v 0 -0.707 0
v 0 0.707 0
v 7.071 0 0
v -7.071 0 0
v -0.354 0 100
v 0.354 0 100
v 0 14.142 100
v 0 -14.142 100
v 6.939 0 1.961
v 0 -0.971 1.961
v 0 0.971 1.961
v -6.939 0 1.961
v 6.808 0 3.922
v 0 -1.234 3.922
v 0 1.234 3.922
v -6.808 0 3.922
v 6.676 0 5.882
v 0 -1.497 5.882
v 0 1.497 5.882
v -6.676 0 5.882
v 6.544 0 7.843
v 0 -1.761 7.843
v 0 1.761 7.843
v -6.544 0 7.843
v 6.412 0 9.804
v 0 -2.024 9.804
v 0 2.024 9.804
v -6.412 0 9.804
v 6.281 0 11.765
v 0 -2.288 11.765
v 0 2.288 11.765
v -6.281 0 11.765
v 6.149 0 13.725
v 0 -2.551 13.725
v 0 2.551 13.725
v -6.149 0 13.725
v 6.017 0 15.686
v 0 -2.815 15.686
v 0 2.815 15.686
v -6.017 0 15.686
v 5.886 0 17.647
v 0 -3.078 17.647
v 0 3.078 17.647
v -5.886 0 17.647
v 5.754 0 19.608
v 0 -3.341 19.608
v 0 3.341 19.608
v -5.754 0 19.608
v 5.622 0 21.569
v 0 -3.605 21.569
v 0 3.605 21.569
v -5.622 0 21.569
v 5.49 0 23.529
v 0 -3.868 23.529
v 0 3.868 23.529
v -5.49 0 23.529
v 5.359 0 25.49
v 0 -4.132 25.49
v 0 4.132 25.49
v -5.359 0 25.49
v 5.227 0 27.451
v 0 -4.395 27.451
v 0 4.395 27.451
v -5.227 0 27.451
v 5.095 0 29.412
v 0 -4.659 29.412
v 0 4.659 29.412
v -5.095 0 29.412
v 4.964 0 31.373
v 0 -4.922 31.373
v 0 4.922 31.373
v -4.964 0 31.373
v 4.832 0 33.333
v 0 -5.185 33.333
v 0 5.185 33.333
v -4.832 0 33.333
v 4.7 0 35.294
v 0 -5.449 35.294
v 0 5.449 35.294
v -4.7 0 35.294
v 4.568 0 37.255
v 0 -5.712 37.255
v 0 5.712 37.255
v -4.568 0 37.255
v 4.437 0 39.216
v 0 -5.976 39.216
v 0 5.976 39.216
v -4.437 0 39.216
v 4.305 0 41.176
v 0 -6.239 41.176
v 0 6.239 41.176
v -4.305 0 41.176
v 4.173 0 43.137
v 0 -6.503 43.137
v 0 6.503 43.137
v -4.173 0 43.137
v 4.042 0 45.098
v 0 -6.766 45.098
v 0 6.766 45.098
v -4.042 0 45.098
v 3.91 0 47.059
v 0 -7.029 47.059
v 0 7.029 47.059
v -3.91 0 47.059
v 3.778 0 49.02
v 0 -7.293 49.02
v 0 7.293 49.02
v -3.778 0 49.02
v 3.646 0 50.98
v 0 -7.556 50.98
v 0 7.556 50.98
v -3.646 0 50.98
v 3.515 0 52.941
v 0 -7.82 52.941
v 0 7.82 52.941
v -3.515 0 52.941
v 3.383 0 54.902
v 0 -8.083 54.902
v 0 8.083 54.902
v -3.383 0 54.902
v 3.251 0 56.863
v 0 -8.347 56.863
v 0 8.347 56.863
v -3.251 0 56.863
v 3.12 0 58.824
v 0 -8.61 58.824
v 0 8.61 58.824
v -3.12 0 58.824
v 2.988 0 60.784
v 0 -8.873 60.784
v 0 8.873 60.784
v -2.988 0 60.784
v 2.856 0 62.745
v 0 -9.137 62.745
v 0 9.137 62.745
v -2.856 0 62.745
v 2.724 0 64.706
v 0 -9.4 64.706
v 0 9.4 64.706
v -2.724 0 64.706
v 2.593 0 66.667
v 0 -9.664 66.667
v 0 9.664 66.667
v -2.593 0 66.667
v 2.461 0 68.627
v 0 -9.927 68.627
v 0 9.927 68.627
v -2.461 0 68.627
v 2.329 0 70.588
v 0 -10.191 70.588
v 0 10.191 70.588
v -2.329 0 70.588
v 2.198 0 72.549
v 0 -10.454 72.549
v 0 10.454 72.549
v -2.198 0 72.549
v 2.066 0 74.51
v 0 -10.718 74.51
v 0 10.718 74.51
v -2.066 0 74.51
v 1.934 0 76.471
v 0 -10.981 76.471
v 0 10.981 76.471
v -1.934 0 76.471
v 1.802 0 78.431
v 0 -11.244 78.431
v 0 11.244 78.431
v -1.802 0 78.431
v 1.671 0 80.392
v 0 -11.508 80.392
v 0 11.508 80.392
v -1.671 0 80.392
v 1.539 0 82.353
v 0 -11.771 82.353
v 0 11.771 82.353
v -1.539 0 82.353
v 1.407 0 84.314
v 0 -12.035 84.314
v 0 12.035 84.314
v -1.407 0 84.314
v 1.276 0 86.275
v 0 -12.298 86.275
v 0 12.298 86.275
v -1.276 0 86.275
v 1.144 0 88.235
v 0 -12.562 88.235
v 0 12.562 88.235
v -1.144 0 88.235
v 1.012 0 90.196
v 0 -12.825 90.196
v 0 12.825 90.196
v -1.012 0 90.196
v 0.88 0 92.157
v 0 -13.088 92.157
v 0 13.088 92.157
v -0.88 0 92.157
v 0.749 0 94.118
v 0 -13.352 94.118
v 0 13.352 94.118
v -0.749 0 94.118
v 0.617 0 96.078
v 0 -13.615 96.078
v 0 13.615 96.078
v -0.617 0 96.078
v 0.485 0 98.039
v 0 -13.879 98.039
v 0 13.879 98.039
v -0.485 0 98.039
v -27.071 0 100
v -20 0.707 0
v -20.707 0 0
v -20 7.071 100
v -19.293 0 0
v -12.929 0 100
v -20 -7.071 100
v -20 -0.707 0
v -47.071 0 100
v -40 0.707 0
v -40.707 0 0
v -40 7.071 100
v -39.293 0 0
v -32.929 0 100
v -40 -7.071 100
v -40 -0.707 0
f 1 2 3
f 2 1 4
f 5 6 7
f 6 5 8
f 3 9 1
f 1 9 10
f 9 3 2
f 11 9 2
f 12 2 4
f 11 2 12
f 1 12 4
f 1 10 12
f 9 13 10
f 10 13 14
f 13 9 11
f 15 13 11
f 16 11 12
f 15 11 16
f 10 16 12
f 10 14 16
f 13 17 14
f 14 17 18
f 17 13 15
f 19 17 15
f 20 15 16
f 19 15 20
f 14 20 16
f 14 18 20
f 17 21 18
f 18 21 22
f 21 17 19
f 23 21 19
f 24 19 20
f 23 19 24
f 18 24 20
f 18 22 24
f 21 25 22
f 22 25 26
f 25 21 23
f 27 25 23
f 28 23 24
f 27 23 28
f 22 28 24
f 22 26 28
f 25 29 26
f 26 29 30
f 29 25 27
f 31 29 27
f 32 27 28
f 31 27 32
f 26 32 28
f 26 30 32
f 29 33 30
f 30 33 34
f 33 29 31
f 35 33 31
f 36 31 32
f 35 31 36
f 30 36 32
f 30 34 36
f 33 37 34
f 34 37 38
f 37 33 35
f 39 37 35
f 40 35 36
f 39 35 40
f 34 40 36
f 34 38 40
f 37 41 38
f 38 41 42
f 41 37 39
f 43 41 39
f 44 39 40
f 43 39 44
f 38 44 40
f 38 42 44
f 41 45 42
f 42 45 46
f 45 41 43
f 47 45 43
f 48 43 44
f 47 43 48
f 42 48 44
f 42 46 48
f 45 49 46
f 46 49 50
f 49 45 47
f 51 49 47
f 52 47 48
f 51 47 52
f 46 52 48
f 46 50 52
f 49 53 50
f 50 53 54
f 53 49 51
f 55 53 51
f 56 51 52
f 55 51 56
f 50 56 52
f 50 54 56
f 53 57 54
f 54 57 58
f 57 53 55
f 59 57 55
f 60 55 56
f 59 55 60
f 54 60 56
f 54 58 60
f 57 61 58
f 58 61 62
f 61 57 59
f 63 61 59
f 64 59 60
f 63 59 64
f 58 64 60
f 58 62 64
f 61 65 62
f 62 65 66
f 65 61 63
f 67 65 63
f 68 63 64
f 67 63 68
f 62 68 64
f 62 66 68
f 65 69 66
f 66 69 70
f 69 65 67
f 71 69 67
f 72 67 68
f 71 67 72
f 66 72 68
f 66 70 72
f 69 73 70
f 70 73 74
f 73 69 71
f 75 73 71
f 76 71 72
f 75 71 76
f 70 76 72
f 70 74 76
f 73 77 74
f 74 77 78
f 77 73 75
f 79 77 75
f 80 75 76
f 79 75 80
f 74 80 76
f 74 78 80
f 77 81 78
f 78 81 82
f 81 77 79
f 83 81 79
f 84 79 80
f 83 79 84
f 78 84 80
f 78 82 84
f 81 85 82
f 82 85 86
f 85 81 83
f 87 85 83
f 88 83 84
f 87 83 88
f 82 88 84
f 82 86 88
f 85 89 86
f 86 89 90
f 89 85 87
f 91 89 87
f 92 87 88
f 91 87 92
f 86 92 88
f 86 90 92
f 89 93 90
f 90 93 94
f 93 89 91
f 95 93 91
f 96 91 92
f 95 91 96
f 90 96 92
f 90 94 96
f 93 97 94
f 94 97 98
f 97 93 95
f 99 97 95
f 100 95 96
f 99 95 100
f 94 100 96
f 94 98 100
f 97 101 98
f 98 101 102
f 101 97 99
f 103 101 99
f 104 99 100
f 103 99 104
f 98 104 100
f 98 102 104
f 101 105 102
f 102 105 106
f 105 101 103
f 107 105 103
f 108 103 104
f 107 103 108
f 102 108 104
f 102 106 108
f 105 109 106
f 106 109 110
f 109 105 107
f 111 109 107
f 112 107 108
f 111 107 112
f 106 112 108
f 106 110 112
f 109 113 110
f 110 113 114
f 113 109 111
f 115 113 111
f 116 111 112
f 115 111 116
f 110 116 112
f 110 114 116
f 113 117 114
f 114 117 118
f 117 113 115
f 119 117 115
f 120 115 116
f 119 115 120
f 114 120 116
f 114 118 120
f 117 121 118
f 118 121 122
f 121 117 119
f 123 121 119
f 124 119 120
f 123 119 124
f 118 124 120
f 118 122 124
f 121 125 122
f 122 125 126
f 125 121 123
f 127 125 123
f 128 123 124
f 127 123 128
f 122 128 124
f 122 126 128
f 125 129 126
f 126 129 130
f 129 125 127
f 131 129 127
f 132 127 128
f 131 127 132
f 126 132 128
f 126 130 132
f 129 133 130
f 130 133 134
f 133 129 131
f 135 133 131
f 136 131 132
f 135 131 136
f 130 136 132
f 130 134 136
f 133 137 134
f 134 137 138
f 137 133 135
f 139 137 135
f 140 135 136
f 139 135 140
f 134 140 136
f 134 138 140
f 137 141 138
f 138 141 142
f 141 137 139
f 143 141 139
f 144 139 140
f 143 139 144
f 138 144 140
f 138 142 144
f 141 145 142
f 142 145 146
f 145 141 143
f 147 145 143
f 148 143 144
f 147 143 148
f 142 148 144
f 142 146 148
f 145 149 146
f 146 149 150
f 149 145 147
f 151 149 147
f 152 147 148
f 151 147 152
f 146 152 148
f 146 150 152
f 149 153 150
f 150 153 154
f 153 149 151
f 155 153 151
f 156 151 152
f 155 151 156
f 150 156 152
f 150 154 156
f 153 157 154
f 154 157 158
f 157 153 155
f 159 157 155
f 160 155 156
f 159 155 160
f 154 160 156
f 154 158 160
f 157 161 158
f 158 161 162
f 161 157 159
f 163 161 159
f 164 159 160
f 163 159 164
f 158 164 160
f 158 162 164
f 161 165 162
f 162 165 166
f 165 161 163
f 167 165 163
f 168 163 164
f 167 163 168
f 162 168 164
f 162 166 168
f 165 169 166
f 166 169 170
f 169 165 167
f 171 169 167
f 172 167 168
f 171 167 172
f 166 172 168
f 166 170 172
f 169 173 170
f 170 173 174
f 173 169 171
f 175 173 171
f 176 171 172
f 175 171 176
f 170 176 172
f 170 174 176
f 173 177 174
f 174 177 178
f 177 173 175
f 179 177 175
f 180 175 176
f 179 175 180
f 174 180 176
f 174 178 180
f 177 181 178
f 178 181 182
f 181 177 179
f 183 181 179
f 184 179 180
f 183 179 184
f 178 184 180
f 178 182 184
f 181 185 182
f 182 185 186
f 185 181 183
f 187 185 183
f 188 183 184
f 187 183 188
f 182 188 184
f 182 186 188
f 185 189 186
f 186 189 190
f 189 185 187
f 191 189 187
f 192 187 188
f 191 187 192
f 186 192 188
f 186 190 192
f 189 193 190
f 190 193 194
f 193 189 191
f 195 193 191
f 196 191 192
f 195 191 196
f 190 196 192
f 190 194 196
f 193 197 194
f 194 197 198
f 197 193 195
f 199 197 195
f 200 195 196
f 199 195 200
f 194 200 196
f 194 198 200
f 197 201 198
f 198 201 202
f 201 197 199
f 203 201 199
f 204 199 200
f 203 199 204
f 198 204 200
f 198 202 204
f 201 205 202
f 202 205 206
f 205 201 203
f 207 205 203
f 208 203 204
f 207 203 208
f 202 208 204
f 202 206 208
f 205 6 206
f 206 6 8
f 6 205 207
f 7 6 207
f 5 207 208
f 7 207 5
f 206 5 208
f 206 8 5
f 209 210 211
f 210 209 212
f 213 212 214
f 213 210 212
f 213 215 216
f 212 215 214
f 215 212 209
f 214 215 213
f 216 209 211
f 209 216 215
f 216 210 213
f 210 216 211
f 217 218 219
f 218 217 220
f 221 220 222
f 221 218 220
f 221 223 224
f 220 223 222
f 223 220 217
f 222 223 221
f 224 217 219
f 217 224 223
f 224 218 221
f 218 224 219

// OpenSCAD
// Volume: 3414.117225798668, SurfaceArea: 2656.802309183198
// This file is to test features which can't be seen (well or at-all) without edges enabled.

// Non-uniformly-scaled untwisted extrude, default slicing.
// Expect multiple horizontal slices.
linear_extrude(h=30, scale=[1/20,20]) scale([1,0.1]) rotate(45) square(10, center=true);

// Uniformly-scaled untwisted extrude, default slicing.
// Expect no horizontal slices.
translate([-20,0,0]) linear_extrude(h=30, scale=[10,10]) scale([0.1,0.1]) rotate(45) square(10, center=true);

// Uniformly-scaled untwisted extrude, explicit slicing.
// Expect three horizontal slices (2 cuts).
translate([-40,0,0]) linear_extrude(h=30, scale=[10,10], slices=3) scale([0.1,0.1]) rotate(45) square(10, center=true);
